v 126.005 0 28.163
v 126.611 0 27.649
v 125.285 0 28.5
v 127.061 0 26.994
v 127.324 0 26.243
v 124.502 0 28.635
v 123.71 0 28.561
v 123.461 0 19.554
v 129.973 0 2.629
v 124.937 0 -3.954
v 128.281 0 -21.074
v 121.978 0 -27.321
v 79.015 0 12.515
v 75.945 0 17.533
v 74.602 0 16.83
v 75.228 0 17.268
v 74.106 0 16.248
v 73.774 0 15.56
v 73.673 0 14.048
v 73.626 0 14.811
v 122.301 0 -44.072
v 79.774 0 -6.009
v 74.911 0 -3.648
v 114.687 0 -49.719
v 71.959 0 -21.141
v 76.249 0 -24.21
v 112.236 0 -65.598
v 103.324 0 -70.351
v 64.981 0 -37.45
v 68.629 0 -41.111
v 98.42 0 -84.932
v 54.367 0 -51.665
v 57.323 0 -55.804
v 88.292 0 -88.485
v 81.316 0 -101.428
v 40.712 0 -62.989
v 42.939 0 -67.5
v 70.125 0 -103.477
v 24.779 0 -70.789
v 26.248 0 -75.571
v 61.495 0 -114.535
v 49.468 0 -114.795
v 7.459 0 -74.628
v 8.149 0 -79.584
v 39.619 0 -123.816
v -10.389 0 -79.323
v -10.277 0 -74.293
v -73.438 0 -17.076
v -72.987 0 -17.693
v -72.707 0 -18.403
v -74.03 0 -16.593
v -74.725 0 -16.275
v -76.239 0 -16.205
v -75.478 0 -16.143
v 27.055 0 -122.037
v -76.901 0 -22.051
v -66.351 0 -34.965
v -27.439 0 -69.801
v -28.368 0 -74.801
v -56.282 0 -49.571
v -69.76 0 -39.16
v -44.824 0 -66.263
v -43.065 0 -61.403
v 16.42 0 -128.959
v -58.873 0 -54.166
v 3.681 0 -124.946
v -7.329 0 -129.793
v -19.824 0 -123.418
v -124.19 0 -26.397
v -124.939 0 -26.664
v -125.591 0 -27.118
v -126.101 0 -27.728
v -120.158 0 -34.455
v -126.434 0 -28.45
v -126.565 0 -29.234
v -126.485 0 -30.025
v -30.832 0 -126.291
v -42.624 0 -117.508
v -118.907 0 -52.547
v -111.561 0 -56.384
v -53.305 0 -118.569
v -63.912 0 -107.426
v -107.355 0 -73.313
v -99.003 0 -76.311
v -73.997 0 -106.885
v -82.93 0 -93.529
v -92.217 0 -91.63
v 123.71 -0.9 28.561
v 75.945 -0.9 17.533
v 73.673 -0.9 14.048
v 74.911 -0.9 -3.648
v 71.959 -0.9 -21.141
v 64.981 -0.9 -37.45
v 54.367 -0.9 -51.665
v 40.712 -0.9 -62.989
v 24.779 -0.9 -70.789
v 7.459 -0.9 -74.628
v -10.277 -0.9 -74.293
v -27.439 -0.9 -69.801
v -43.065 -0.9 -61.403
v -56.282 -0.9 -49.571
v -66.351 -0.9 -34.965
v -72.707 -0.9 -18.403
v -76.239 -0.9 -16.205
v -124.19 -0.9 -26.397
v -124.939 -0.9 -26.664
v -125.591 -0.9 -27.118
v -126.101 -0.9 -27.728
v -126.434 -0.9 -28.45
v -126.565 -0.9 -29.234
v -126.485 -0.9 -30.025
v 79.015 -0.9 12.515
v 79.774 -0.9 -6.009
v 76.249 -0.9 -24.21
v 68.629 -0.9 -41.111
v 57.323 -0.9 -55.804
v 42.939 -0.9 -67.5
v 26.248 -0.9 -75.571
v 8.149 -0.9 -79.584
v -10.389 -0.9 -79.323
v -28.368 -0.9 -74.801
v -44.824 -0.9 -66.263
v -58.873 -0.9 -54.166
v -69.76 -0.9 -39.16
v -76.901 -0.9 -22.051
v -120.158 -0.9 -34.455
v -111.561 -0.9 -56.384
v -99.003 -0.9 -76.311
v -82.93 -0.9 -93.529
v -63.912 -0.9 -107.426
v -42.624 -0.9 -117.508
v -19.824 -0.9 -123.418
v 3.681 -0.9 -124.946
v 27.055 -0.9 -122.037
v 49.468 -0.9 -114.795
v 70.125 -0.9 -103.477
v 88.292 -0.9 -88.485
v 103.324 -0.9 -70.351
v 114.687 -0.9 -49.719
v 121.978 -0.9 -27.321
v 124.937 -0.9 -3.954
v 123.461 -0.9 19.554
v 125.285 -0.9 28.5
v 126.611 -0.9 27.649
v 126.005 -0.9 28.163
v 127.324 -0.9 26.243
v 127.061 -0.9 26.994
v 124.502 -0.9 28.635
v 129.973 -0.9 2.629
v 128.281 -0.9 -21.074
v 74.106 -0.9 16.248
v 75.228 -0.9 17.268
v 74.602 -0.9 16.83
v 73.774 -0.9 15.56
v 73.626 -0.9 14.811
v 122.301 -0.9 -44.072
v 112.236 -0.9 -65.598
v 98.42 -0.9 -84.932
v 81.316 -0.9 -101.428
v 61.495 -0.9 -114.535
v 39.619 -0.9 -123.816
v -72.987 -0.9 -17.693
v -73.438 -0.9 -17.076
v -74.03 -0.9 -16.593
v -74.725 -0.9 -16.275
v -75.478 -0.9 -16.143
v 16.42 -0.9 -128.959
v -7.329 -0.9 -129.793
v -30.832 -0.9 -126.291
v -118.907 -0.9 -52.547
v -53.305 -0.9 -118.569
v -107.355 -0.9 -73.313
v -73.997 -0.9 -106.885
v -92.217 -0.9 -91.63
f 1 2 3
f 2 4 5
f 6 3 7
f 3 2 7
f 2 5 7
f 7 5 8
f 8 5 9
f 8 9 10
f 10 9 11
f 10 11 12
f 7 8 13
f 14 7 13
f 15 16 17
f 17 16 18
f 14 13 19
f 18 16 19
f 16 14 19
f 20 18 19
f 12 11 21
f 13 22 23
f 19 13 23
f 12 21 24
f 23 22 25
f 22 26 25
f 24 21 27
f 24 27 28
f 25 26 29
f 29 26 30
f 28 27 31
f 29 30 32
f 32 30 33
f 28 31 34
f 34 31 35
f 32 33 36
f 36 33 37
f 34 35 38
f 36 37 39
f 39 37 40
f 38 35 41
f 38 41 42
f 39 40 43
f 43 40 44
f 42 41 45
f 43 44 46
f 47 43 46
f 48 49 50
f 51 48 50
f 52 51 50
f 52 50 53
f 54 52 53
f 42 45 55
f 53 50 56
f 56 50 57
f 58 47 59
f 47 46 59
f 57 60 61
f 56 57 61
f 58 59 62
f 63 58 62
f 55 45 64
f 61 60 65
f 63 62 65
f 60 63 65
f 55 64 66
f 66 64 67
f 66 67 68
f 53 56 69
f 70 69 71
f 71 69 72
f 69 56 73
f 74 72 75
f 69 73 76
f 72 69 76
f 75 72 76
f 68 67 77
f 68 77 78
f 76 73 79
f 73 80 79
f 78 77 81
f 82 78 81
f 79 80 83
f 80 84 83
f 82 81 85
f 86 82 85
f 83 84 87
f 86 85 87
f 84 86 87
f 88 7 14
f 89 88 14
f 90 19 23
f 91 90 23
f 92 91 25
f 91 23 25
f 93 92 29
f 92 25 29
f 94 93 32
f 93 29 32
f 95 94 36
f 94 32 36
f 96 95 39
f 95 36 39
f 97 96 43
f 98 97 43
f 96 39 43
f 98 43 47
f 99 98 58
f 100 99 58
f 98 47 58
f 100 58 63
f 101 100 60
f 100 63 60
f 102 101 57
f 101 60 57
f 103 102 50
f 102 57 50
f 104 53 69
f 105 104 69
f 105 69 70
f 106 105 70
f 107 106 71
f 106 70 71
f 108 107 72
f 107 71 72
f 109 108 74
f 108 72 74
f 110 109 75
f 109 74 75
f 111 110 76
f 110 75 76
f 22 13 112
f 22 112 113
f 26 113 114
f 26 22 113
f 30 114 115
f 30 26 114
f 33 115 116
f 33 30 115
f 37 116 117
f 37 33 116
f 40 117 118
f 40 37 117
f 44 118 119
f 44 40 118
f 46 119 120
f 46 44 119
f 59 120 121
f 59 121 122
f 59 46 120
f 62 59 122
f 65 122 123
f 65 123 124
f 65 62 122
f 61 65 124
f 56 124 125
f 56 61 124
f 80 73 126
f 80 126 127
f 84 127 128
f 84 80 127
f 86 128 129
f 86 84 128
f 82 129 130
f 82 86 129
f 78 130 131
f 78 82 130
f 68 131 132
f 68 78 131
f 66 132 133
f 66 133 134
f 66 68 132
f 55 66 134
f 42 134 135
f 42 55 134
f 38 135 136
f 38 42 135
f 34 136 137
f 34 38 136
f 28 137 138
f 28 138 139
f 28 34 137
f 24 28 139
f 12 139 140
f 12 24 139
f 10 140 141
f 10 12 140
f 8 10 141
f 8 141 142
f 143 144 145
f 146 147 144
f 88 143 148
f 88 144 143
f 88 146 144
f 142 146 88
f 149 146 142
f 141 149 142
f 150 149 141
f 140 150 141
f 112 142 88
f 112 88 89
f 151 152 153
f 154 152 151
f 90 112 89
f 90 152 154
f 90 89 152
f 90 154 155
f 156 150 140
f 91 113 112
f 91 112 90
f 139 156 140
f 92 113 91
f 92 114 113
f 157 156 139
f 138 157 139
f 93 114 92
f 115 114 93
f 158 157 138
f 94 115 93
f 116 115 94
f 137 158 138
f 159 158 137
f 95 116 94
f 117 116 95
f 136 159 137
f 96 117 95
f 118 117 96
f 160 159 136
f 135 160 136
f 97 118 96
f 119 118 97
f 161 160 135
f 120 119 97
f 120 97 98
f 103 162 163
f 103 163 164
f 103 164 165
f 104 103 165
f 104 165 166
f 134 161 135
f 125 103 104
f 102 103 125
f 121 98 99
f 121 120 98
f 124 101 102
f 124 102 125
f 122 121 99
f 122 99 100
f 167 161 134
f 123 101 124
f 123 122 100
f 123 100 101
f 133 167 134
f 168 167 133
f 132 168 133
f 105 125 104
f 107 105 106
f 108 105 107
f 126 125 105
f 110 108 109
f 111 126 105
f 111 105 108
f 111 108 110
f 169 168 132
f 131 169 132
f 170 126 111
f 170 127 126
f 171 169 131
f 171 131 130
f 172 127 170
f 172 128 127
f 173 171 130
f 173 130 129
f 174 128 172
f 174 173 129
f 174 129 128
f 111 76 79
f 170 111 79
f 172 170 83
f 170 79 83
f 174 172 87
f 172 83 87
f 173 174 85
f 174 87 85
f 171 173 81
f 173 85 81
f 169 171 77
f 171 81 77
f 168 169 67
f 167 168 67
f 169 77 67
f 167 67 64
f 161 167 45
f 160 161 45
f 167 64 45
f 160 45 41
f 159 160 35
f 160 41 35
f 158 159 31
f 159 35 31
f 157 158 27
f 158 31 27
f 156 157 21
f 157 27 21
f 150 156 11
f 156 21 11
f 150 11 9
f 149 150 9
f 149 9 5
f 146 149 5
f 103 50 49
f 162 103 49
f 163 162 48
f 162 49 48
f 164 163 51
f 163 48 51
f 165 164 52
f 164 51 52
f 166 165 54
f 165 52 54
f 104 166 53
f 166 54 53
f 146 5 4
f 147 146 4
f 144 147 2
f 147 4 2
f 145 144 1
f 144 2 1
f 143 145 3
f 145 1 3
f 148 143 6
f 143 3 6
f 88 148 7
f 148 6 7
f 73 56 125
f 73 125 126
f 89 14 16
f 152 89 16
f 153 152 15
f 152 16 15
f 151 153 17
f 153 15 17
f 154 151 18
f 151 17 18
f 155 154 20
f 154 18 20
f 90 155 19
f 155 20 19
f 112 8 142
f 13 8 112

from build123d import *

# Parameters (mm, degrees)
BASE_FLANGE1_DEPTH = 0.9


# Sheet-metal steps are written as plain solids
with BuildPart() as part:
    # Sketch1 → Base-Flange1 (new body)
    with BuildSketch(Plane(origin=(0, 0, 0), x_dir=(1, 0, 0), z_dir=(0, 1, 0))):
        with BuildLine():
            Line((-76.23906038, 16.205112539), (-124.190081684, 26.397416756))
            ThreePointArc((-124.190081684, 26.397416756), (-126.101482372, 27.727775186), (-126.485236689, 30.024738131))
            ThreePointArc((-126.485236689, 30.024738131), (28.137149812, 126.918480926), (127.323557594, -26.243316894))
            ThreePointArc((127.323557594, -26.243316894), (126.005019582, -28.162890715), (123.710468487, -28.560812083))
            Line((123.710468487, -28.560812083), (75.944630591, -17.53319949))
            ThreePointArc((75.944630591, -17.53319949), (74.106388046, -16.248487893), (73.672580533, -14.048162785))
            ThreePointArc((73.672580533, -14.048162785), (16.232971045, 73.222200534), (-72.707043565, 18.403418598))
            ThreePointArc((-72.707043565, 18.403418598), (-74.030104265, 16.592581795), (-76.23906038, 16.205112539))
        make_face()
        with BuildLine():
            Line((-76.900935675, 22.050988465), (-120.157711992, 34.454669477))
            ThreePointArc((-120.157711992, 34.454669477), (27.054951742, 122.03700089), (123.461042574, -19.55430813))
            Line((123.461042574, -19.55430813), (79.015067248, -12.514757203))
            ThreePointArc((79.015067248, -12.514757203), (17.315169115, 78.10368057), (-76.900935675, 22.050988465))
        make_face(mode=Mode.SUBTRACT)
    extrude(amount=-BASE_FLANGE1_DEPTH)


solid = part.part
